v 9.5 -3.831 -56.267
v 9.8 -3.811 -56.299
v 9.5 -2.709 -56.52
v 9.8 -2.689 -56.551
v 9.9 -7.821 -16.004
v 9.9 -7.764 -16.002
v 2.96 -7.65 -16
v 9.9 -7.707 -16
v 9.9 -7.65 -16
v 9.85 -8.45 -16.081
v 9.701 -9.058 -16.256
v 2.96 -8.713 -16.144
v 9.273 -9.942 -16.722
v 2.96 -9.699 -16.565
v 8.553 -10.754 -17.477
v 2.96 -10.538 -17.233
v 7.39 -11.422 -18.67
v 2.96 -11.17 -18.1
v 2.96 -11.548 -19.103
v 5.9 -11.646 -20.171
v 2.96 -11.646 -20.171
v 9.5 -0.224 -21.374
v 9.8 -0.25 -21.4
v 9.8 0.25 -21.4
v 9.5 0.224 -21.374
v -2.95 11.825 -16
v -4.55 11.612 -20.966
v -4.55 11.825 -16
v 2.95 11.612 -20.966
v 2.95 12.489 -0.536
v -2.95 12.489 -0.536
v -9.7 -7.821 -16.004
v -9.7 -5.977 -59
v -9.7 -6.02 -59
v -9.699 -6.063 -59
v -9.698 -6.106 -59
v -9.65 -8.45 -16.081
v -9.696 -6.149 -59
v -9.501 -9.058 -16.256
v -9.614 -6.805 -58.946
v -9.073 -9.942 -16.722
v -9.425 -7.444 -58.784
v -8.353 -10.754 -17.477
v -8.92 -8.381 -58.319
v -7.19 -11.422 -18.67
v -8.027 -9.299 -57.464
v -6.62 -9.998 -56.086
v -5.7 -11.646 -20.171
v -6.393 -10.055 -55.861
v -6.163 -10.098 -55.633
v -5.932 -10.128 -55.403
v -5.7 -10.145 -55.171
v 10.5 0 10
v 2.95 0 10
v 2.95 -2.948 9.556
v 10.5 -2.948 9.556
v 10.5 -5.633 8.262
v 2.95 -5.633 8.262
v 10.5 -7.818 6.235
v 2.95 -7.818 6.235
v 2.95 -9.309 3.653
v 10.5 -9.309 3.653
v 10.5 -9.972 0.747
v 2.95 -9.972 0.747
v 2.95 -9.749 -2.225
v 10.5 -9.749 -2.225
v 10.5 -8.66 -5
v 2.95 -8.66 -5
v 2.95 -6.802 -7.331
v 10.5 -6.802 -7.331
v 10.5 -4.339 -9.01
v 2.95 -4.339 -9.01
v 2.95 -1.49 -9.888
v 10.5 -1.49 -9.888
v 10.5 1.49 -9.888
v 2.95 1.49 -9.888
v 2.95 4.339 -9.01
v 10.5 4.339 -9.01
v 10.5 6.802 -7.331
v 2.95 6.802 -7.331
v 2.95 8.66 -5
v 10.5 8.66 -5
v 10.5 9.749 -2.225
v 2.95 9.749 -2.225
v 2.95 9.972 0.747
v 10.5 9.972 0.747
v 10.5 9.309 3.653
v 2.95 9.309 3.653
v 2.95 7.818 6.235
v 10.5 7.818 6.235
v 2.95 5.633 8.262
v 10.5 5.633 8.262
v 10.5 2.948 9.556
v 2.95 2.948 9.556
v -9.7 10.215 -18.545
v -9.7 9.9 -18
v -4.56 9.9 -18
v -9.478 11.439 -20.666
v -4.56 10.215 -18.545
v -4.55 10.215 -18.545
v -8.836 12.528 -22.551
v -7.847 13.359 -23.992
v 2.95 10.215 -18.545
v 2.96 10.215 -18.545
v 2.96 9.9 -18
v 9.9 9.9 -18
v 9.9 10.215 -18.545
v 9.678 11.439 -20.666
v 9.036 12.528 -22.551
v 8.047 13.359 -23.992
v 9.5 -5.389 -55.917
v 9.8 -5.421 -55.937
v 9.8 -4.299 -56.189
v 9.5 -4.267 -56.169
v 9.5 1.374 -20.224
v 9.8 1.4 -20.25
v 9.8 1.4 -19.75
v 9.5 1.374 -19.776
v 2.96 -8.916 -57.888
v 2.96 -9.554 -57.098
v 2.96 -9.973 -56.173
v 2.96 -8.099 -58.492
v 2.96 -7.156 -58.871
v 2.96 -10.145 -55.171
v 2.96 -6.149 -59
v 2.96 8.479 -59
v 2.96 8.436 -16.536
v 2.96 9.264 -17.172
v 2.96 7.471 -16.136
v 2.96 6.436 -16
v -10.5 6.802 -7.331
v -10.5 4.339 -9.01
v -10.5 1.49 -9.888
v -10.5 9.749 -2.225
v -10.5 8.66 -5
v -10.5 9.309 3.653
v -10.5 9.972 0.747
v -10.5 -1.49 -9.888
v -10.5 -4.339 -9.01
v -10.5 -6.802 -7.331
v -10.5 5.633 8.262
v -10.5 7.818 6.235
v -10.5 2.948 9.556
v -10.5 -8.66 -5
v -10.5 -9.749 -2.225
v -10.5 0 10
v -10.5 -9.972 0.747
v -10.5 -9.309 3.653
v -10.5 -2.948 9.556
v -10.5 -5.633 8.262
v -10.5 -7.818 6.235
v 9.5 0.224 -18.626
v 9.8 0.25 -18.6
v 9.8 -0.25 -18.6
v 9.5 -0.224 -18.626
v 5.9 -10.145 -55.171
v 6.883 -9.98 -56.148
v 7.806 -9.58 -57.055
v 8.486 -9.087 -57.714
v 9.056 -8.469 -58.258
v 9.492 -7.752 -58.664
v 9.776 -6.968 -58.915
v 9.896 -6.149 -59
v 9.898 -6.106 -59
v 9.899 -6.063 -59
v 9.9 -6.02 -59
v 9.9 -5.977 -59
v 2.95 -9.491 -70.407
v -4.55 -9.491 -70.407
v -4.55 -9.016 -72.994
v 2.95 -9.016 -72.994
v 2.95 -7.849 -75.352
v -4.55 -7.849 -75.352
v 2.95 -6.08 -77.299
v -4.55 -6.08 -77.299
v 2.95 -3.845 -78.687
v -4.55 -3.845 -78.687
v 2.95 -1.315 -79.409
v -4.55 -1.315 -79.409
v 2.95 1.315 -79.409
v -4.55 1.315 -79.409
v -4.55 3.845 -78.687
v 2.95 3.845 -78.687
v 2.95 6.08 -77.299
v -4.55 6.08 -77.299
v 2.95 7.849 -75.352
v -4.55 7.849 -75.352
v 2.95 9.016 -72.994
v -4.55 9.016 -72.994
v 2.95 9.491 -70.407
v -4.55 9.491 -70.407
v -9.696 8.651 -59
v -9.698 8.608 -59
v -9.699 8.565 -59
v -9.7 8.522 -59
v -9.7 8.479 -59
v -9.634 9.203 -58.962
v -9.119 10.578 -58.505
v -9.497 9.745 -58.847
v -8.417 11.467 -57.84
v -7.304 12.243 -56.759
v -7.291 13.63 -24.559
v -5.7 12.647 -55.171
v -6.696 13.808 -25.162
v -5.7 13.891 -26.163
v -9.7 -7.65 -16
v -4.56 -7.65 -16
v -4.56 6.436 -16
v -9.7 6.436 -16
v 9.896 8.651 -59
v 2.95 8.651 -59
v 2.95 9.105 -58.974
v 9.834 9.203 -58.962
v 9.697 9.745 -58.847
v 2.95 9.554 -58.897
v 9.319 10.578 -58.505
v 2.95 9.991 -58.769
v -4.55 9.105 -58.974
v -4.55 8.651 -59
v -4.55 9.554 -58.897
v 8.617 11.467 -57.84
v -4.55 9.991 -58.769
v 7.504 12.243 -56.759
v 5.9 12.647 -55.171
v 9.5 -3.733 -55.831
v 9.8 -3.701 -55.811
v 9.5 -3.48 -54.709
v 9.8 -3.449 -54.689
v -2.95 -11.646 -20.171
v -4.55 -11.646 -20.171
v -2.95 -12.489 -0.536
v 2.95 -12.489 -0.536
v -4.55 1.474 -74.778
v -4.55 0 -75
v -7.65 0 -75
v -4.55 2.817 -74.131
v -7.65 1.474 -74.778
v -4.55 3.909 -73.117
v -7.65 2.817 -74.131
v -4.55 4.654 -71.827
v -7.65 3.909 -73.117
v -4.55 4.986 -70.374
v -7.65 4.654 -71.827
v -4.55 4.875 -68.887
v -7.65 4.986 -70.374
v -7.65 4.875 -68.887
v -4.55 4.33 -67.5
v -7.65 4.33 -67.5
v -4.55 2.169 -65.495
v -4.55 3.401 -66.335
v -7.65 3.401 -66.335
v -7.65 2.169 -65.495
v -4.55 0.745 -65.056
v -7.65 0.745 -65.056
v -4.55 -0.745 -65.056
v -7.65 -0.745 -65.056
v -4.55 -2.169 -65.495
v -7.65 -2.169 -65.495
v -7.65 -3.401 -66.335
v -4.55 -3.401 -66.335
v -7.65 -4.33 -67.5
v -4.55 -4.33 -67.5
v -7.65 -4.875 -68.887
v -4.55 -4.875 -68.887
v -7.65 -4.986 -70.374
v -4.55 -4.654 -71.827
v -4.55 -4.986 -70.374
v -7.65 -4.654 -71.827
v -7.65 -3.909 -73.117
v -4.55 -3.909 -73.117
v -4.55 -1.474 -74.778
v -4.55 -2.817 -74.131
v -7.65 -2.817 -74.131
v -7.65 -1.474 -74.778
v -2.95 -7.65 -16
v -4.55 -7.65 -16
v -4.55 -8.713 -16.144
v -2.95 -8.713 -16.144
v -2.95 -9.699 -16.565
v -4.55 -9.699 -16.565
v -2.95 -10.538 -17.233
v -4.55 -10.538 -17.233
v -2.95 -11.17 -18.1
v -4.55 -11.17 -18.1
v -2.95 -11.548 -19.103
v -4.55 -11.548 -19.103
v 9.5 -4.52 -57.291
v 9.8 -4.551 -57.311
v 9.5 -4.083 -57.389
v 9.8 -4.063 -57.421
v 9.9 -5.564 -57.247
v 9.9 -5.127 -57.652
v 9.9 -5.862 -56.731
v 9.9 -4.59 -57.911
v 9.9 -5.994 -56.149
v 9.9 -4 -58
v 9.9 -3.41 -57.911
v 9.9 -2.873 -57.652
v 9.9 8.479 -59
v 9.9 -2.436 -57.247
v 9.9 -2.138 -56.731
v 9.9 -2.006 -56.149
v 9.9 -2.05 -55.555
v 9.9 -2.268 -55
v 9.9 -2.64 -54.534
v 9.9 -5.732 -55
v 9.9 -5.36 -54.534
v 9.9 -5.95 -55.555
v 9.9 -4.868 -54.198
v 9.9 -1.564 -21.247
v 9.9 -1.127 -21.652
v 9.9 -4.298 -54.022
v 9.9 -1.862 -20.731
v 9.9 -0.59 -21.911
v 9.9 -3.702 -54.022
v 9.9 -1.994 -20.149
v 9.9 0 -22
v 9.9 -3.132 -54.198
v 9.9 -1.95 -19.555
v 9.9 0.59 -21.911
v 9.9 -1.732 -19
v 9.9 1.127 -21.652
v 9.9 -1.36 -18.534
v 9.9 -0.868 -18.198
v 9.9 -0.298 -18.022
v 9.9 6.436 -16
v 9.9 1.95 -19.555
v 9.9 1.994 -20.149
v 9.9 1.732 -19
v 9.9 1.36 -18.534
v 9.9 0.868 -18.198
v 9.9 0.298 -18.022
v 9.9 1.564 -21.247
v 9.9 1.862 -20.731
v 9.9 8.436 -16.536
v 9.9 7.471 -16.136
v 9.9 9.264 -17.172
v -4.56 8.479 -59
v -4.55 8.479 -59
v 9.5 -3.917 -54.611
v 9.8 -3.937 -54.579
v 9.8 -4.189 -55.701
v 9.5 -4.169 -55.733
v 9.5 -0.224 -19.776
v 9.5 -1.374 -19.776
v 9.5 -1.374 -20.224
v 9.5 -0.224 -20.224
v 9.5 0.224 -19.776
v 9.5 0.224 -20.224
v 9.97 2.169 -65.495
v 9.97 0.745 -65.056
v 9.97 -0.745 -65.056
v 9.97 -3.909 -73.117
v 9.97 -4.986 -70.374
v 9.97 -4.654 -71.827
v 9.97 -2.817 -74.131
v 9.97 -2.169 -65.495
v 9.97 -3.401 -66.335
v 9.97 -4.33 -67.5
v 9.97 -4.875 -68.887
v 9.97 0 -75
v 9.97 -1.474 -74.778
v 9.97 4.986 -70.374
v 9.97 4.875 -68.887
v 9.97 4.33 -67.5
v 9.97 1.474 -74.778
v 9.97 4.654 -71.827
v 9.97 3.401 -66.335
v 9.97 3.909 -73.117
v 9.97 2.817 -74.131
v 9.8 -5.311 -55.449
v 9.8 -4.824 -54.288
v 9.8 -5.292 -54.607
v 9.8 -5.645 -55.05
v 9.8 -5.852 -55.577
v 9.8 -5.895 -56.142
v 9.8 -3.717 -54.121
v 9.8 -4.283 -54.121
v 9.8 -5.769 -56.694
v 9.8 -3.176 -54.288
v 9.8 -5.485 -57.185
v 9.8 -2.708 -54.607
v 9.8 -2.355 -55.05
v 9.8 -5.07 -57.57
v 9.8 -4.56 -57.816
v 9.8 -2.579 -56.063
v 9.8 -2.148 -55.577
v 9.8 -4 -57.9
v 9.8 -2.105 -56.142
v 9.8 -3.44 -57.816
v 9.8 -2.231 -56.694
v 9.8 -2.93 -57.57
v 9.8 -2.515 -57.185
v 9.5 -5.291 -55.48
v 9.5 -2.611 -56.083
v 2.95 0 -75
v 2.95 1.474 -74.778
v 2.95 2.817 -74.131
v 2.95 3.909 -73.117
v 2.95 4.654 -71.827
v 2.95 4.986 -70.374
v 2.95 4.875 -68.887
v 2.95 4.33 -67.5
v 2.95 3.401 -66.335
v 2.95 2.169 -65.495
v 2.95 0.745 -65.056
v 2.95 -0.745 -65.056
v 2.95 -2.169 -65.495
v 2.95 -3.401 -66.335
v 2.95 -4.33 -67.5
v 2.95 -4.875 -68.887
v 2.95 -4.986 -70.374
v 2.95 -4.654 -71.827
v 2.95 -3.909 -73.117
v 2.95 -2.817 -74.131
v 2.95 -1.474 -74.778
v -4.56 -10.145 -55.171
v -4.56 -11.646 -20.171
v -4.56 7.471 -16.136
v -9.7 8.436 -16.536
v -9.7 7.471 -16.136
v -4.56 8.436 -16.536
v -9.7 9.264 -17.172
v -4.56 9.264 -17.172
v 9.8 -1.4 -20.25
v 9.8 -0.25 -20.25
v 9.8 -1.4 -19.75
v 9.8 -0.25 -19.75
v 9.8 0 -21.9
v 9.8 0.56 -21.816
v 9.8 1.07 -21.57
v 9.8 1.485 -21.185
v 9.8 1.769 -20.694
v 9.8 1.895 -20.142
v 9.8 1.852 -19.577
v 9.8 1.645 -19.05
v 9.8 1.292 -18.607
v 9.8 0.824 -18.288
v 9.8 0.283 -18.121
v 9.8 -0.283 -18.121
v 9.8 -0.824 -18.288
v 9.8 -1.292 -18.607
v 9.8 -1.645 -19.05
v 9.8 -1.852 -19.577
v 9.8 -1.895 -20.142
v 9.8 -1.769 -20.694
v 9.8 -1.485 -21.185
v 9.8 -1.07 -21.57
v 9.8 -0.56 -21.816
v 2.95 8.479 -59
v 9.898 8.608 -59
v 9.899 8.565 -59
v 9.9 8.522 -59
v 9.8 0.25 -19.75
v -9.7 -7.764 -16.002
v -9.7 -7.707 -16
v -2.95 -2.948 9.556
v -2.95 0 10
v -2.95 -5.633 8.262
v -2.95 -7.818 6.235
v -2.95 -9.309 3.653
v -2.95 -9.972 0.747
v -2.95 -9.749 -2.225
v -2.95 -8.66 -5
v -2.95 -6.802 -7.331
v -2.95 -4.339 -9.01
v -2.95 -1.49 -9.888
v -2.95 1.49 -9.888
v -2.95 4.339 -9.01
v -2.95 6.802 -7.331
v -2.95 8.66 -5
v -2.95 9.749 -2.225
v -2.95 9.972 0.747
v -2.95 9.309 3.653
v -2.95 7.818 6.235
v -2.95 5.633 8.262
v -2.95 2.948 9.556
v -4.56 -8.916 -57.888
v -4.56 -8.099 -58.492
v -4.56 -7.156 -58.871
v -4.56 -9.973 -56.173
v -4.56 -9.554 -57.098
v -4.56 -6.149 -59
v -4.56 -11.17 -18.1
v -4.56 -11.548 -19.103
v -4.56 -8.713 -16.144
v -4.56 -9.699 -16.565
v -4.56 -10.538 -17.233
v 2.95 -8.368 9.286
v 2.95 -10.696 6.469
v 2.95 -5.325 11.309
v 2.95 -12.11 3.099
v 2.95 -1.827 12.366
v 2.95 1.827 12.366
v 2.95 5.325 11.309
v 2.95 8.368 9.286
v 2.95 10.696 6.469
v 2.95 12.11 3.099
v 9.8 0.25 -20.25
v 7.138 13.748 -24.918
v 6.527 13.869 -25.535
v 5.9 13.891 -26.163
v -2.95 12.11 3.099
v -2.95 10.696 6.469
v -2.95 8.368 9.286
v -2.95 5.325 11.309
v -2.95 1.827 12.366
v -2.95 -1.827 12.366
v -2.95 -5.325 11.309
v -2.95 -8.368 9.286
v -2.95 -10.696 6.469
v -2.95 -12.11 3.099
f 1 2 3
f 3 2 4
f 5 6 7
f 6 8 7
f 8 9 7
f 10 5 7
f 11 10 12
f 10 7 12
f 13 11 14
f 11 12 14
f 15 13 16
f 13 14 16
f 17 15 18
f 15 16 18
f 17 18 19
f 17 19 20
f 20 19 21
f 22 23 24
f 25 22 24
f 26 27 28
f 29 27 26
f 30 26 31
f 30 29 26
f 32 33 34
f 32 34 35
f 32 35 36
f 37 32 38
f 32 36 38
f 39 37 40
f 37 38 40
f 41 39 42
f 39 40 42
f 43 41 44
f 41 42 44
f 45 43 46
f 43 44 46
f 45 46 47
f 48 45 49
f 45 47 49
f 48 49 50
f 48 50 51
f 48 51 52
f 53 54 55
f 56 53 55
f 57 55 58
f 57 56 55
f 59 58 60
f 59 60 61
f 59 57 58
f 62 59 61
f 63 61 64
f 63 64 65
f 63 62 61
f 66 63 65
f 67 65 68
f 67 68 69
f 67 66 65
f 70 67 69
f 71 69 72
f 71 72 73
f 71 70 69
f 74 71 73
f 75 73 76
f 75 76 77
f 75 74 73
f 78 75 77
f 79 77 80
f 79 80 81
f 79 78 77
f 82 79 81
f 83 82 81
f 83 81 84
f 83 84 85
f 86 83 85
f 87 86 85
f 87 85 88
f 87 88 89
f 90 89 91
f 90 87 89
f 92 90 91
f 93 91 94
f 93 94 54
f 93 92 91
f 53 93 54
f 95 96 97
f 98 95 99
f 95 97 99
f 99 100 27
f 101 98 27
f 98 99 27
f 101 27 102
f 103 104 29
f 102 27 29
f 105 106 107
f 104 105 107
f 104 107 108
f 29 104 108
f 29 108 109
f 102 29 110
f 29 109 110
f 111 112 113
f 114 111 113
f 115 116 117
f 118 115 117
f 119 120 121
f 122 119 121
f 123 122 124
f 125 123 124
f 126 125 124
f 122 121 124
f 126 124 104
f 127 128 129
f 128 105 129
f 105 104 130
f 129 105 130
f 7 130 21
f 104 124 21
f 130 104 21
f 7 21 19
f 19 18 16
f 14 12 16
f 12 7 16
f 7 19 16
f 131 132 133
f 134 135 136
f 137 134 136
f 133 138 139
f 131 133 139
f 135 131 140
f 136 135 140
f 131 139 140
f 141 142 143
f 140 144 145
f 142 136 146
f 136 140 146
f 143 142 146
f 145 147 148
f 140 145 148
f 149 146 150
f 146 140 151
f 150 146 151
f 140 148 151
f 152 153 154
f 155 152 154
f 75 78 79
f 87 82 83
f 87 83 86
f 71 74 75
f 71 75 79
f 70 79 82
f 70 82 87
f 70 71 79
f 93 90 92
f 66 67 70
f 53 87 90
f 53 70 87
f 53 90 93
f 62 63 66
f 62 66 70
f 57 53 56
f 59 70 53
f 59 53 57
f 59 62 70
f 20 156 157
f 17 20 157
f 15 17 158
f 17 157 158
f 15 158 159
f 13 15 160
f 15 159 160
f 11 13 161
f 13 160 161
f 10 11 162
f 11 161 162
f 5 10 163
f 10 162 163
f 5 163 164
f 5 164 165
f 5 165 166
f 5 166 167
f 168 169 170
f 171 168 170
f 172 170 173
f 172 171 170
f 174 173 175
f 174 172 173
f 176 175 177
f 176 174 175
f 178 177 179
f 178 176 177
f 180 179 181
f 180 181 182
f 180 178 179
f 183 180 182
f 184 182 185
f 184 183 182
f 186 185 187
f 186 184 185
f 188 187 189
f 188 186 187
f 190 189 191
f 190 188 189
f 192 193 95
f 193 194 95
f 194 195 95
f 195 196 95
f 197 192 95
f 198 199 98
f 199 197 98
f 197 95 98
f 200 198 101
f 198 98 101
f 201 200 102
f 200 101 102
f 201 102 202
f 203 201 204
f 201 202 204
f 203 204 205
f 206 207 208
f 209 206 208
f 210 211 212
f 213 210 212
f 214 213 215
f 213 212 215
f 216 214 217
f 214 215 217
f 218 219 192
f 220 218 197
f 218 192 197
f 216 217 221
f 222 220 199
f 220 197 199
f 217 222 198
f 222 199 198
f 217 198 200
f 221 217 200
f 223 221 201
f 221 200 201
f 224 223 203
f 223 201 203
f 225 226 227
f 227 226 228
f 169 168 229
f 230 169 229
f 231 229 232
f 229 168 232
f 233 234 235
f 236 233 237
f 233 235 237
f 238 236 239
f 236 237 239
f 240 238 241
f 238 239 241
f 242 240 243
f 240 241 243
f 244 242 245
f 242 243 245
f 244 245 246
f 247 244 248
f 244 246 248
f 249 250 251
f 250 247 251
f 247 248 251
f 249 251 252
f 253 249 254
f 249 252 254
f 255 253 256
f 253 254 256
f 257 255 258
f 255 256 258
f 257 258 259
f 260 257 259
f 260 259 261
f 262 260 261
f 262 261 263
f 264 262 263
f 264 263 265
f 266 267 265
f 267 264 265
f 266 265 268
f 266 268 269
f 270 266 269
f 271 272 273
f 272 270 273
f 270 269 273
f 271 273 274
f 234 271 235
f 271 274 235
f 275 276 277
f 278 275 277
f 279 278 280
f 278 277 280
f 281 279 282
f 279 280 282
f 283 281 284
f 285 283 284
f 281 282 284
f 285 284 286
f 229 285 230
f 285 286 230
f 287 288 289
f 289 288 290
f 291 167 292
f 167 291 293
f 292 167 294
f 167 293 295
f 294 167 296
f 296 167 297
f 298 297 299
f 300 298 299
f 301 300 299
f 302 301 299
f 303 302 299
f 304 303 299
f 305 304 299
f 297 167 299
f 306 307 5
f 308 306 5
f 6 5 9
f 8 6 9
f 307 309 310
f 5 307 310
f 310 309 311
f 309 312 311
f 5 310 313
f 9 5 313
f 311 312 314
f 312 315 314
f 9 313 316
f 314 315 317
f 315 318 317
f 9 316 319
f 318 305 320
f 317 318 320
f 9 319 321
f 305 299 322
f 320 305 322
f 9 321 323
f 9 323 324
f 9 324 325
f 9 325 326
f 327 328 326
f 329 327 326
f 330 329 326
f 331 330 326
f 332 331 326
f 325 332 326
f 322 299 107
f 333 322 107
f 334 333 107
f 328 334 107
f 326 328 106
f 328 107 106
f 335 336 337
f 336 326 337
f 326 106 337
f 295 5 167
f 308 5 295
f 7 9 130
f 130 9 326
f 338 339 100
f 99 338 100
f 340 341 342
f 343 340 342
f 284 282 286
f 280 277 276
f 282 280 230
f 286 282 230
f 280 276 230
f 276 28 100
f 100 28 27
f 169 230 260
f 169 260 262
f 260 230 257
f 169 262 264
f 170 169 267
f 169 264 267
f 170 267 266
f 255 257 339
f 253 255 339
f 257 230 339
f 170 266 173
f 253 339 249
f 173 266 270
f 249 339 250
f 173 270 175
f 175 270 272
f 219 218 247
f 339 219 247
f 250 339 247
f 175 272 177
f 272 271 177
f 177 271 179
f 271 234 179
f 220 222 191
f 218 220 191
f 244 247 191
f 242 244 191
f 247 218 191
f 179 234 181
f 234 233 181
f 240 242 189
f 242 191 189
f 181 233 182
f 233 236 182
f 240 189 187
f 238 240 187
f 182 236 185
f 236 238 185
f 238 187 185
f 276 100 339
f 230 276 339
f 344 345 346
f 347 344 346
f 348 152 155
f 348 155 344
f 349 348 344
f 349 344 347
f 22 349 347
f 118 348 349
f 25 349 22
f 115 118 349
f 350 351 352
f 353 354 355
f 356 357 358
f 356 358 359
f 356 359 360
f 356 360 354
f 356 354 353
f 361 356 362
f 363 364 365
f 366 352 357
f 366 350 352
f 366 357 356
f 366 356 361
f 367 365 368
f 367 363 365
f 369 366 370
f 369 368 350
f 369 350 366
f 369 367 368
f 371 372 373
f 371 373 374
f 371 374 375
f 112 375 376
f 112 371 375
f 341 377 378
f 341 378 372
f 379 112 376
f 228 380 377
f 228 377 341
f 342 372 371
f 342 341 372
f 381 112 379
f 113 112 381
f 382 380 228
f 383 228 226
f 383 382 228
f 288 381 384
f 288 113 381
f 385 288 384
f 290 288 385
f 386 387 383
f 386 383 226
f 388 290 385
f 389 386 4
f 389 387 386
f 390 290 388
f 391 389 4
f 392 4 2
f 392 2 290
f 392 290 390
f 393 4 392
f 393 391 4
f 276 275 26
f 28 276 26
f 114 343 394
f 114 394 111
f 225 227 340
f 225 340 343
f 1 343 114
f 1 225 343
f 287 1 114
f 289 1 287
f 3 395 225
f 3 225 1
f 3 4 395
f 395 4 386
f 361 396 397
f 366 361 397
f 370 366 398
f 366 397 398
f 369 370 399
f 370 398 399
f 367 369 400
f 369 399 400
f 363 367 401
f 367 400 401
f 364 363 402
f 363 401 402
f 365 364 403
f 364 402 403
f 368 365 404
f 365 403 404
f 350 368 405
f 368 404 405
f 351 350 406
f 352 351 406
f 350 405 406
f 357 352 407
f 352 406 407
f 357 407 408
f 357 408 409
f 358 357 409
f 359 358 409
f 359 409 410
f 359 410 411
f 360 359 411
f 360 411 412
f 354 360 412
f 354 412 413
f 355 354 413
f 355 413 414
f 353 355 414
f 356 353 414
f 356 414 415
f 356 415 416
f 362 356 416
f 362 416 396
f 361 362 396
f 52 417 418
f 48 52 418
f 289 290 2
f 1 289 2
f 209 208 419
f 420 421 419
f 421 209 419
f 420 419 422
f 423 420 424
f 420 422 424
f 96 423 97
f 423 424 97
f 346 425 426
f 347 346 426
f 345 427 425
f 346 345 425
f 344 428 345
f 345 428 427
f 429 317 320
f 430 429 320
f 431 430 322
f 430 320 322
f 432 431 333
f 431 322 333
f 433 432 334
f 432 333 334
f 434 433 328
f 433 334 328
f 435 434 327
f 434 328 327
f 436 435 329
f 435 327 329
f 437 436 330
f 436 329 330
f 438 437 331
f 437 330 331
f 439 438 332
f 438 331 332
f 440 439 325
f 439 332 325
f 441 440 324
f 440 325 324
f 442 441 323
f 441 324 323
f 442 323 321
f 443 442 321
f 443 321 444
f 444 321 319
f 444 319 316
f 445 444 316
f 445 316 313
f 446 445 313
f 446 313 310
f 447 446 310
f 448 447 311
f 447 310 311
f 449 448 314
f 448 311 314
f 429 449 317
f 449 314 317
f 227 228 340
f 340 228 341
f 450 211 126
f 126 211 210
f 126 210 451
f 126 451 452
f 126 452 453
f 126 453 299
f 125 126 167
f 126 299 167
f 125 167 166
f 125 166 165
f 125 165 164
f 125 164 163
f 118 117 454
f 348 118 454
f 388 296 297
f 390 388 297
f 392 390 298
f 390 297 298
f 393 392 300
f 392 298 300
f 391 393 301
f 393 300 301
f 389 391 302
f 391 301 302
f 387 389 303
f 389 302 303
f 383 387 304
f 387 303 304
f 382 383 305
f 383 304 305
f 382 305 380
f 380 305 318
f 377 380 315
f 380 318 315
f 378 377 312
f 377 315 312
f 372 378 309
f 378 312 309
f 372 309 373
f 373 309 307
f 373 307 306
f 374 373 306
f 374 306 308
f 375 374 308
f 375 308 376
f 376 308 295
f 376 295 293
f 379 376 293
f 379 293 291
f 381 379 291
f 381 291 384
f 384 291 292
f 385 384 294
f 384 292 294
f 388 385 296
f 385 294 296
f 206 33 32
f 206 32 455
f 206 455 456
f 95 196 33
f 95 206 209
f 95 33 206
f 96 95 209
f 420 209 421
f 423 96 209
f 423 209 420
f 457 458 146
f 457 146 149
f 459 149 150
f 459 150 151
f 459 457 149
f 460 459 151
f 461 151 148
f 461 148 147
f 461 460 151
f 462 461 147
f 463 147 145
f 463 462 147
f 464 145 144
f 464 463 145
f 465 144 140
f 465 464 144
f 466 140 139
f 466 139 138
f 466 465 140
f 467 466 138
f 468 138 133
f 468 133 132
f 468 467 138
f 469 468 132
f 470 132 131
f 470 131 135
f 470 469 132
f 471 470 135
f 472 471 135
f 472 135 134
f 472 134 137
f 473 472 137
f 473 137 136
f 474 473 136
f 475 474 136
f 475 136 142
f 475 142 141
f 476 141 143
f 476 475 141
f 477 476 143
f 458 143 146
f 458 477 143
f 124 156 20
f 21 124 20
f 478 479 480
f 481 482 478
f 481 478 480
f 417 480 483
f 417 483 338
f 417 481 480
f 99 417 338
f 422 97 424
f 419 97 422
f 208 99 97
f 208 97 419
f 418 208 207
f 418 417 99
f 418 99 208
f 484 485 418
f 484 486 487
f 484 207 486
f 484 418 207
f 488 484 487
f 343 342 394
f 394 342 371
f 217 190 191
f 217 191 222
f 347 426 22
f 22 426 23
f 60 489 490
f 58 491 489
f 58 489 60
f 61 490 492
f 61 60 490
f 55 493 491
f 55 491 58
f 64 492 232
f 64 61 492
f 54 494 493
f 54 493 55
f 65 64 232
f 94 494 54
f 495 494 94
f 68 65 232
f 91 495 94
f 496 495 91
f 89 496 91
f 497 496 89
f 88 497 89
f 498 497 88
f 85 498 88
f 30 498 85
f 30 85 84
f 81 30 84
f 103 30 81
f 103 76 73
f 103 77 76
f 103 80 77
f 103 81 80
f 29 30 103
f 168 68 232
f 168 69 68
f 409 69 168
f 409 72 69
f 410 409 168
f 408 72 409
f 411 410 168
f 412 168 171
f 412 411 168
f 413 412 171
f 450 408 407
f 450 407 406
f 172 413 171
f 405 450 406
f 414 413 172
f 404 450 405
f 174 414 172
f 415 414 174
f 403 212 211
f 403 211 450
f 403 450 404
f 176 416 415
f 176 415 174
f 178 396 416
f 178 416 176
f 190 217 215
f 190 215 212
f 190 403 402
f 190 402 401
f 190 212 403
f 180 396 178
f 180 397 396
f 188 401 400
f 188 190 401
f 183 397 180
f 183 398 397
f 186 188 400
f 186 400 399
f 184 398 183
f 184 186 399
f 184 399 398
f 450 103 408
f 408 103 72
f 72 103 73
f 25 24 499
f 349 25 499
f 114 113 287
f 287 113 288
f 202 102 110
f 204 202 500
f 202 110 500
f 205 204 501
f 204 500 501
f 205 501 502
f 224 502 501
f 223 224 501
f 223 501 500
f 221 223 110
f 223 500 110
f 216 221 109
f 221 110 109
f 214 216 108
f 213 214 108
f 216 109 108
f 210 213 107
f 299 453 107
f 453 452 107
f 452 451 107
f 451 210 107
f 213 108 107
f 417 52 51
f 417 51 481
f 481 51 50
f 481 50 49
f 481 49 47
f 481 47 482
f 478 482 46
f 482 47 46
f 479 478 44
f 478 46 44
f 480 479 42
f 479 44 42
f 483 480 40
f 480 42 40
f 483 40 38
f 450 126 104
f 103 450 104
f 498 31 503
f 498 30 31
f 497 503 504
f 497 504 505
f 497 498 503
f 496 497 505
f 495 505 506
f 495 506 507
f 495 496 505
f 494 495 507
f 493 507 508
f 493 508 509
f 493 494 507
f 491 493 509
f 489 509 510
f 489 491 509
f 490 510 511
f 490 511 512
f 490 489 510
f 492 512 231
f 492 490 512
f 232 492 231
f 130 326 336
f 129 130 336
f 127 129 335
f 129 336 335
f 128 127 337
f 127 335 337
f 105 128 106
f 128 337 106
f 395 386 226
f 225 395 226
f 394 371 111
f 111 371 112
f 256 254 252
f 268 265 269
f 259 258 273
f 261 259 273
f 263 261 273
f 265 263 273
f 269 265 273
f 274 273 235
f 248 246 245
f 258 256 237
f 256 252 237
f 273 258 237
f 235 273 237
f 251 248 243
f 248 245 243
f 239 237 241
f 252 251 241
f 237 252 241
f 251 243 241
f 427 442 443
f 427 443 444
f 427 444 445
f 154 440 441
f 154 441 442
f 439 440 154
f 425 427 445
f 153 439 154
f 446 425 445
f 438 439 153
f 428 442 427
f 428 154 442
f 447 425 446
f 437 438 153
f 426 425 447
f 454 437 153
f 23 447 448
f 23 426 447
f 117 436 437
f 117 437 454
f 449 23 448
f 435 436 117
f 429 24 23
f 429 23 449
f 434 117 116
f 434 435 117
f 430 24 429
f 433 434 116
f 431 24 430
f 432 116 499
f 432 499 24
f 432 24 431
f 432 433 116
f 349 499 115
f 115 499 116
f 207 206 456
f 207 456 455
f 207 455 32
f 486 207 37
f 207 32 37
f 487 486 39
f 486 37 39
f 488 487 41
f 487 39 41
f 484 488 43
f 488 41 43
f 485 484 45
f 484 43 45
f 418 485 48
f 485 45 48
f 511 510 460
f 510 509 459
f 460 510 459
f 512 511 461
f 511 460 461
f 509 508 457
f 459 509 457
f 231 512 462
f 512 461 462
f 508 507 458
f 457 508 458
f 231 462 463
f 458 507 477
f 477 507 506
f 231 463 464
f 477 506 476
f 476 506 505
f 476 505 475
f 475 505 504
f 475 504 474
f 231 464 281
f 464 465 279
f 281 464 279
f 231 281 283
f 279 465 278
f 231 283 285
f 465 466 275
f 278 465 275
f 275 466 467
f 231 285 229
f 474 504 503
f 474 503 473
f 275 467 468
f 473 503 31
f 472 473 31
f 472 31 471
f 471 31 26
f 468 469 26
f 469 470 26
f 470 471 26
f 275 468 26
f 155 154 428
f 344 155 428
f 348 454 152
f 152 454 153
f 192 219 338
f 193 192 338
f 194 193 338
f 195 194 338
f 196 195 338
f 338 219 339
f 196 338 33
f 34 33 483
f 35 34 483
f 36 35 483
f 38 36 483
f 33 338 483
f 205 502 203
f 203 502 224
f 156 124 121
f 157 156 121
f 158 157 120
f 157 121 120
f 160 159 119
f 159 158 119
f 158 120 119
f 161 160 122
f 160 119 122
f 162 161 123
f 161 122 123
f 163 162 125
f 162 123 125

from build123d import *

# Parameters (mm, degrees)
BOSS_EXTRUDE1_DEPTH              = 2.95
BOSS_EXTRUDE2_DEPTH              = 1.6
SKETCH3_R                        = 10
BOSS_EXTRUDE3_DEPTH              = 10.5
FILLET1_R                        = 4
BOSS_EXTRUDE4_DEPTH              = 5.15
BOSS_EXTRUDE4_DEPTH_BACK         = 14.45
CUT_EXTRUDE1_REACH               = 87.429
CUT_EXTRUDE1_OFFSET_FROM_SURFACE = 1.5
SKETCH6_W                        = 0.00999999999999979
SKETCH6_H                        = 45.002265551352366
SKETCH6_W_2                      = 0.01000000000000023
SKETCH6_H_2                      = 45.03954427852518
FILLET2_R                        = 4
BOSS_EXTRUDE5_DEPTH              = 7.02
BOSS_EXTRUDE5_DEPTH_BACK         = 10.6
SKETCH7_R                        = 5.000000000000004
SKETCH8_R                        = 2.000000000000003
CUT_EXTRUDE2_DEPTH               = 0.1
CUT_EXTRUDE2_DRAFT               = -45.0000000000001
CUT_EXTRUDE2_PROFILE_2_DEPTH     = 0.1
CUT_EXTRUDE2_PROFILE_2_DRAFT     = -45.0000000000001
CUT_EXTRUDE3_DEPTH               = 0.3
CUT_EXTRUDE3_DRAFT               = -5.000000000000011
CUT_EXTRUDE3_PROFILE_2_DEPTH     = 0.3
CUT_EXTRUDE3_PROFILE_2_DRAFT     = -5.000000000000011


with BuildPart() as part:
    # Sketch1 → Boss-Extrude1 (new, symmetric)
    with BuildSketch(Plane(origin=(0, 0, 0), x_dir=(0, 0, -1), z_dir=(1, 0, 0))):
        with BuildLine():
            Line((0.5357142857142857, -12.488515132075614), (70.40714285714286, -9.491271500377467))
            ThreePointArc((70.40714285714286, -9.491271500377467), (79.5, 0), (70.40714285714286, 9.491271500377463))
            Line((70.40714285714286, 9.491271500377463), (0.5357142857142858, 12.488515132075614))
            ThreePointArc((0.5357142857142858, 12.488515132075614), (-12.499999999999998, 1.53e-15), (0.5357142857142857, -12.488515132075614))
        make_face()
    extrude(amount=BOSS_EXTRUDE1_DEPTH, both=True)

    # Sketch2 → Boss-Extrude2 (add)
    with BuildSketch(Plane.ZY.offset(2.95)):
        with BuildLine():
            Line((-70.40714285714286, 9.491271500377463), (-16, 11.825150537654586))
            Line((-16, 11.825150537654586), (-15.999999999999993, -11.825150537654586))
            Line((-15.999999999999993, -11.825150537654586), (-70.40714285714286, -9.491271500377465))
            ThreePointArc((-70.40714285714286, -9.491271500377465), (-79.5, 1.16e-15), (-70.40714285714286, 9.491271500377463))
        make_face()
    extrude(amount=BOSS_EXTRUDE2_DEPTH)

    # Sketch3 → Boss-Extrude3 (add, symmetric)
    with BuildSketch(Plane(origin=(0, 0, 0), x_dir=(0, 0, -1), z_dir=(1, 0, 0))):
        with Locations(Location((0, 0, 0), (0, 0, 180))):
            Circle(SKETCH3_R)
    extrude(amount=BOSS_EXTRUDE3_DEPTH, both=True)

    # Fillet1
    fillet1_edges = [part.edges().sort_by_distance(p)[0] for p in [
        (-3.75, -11.825150537654586, -15.999999999999993),
    ]]
    fillet(fillet1_edges, radius=FILLET1_R)

    # Sketch4 → Boss-Extrude4 (add, two sides: drawn at the far end of the back side and taken through both)
    with BuildSketch(Plane.ZY.offset(4.55).offset(-BOSS_EXTRUDE4_DEPTH_BACK)):
        Polygon((-15.999999999999993, -11.825150537654581), (-15.999999999999993, 8.745228199074802), (-24.999999999999993, 13.941380621781402), (-58.99999999999999, 12.482897725964271), (-58.99999999999999, -9.980598640003508), align=None)
    extrude(amount=BOSS_EXTRUDE4_DEPTH + BOSS_EXTRUDE4_DEPTH_BACK)

    # Cut-Extrude1: up to this face of the body (flat: up to its plane, moved by the offset)
    cut_extrude1_end = Plane(part.part.faces().sort_by_distance((-0.231891902, 12.029817895, -11.228816075))[0]).offset(-CUT_EXTRUDE1_OFFSET_FROM_SURFACE)
    # Sketch6 → Cut-Extrude1 (cut, up to the picked face)
    with BuildSketch(Plane(origin=(0, -12.488515132075618, -0.5357142857142859), x_dir=(1, 0, 0), z_dir=(0, -0.9990812105660494, -0.04285714285714288)), mode=Mode.PRIVATE) as cut_extrude1_sk1:
        with Locations((-4.555, -37.97963997883348)):
            Rectangle(SKETCH6_W, SKETCH6_H)
    cut_extrude1_tool1 = split(extrude(cut_extrude1_sk1.sketch, amount=-CUT_EXTRUDE1_REACH, mode=Mode.PRIVATE), bisect_by=cut_extrude1_end, keep=Keep.BOTH, mode=Mode.PRIVATE)
    # Sketch6 → Cut-Extrude1 (cut, up to the picked face)
    with BuildSketch(Plane(origin=(0, -12.488515132075618, -0.5357142857142859), x_dir=(1, 0, 0), z_dir=(0, -0.9990812105660494, -0.04285714285714288)), mode=Mode.PRIVATE) as cut_extrude1_sk2:
        with Locations((2.955, -37.99827934241989)):
            Rectangle(SKETCH6_W_2, SKETCH6_H_2)
    cut_extrude1_tool2 = split(extrude(cut_extrude1_sk2.sketch, amount=-CUT_EXTRUDE1_REACH, mode=Mode.PRIVATE), bisect_by=cut_extrude1_end, keep=Keep.BOTH, mode=Mode.PRIVATE)
    add(cut_extrude1_tool1.solids().sort_by(Axis((-4.555, -10.860816, -38.480459), (0, 0.9990812105660494, 0.04285714285714288)))[0], mode=Mode.SUBTRACT)
    add(cut_extrude1_tool2.solids().sort_by(Axis((2.955, -10.860017, -38.499081), (0, 0.9990812105660494, 0.04285714285714288)))[0], mode=Mode.SUBTRACT)

    # Fillet2
    # the kernel refuses this fillet: 4 mm, written as the material it adds along each edge
    # the kernel refuses this fillet: 4 mm, written as the material it takes off along each edge
    with BuildSketch(Plane(origin=(-14.988161901436335, -11.825150537654586, -15.999999999999993), x_dir=(0, 0.04285714285714257, -0.9990812105660493), z_dir=(1, 0, 0))) as fillet2_2_piece_1:
        with BuildLine():
            CenterArc((FILLET2_R * 1.04381619014, FILLET2_R), FILLET2_R, 177.54371427641803, 92.45628572358197)
            Line((FILLET2_R * 0.0447349795776, FILLET2_R * 1.04285714286), (0, 0))
            Line((0, 0), (FILLET2_R * 1.04381619014, 0))
        make_face()
    extrude(amount=12.038161901436336, mode=Mode.SUBTRACT)
    with BuildSketch(Plane(origin=(-14.988161901436335, -11.825150537654586, -15.999999999999993), x_dir=(0, 0.04285714285714257, -0.9990812105660493), z_dir=(1, 0, 0))) as fillet2_2_piece_2_section:
        with BuildLine():
            CenterArc((FILLET2_R * 1.04381619014, FILLET2_R), FILLET2_R, 177.54371427641803, 92.45628572358197)
            Line((FILLET2_R * 0.0447349795776, FILLET2_R * 1.04285714286), (0, 0))
            Line((0, 0), (FILLET2_R * 1.04381619014, 0))
        make_face()
    fillet2_2_piece_2 = extrude(amount=22.47632380287267, mode=Mode.PRIVATE)
    fillet2_2_piece_2 = split(fillet2_2_piece_2, bisect_by=Plane(origin=(2.9600000000000004, -10.846311572952873, -16.937750318441594), z_dir=(1, 0, 0)), keep=Keep.TOP, mode=Mode.PRIVATE)
    add(fillet2_2_piece_2, mode=Mode.SUBTRACT)
    with BuildSketch(Plane(origin=(-7.478161901436335, -11.825150537654586, -15.999999999999993), x_dir=(0, 0.04285714285714257, -0.9990812105660493), z_dir=(1, 0, 0))) as fillet2_2_piece_3_section:
        with BuildLine():
            CenterArc((FILLET2_R * 1.04381619014, FILLET2_R), FILLET2_R, 177.54371427641803, 92.45628572358197)
            Line((FILLET2_R * 0.0447349795776, FILLET2_R * 1.04285714286), (0, 0))
            Line((0, 0), (FILLET2_R * 1.04381619014, 0))
        make_face()
    fillet2_2_piece_3 = extrude(amount=27.816323802872674, mode=Mode.PRIVATE)
    fillet2_2_piece_3 = split(fillet2_2_piece_3, bisect_by=Plane(origin=(-2.95, -10.846311572952875, -16.937750318441612), z_dir=(-1, 0, 0)), keep=Keep.TOP, mode=Mode.PRIVATE)
    add(fillet2_2_piece_3, mode=Mode.SUBTRACT)
    with BuildSketch(Plane(origin=(2.960000000000001, -11.825150537654581, -15.999999999999993), x_dir=(0, 0.042857142857141296, -0.9990812105660493), z_dir=(1, 0, 0))) as fillet2_2_piece_4:
        with BuildLine():
            CenterArc((FILLET2_R * 1.04381619014, FILLET2_R), FILLET2_R, 177.54371427641803, 92.45628572358203)
            Line((FILLET2_R * 0.0447349795776, FILLET2_R * 1.04285714286), (0, 0))
            Line((0, 0), (FILLET2_R * 1.04381619014, -1e-17))
        make_face()
    extrude(amount=17.378161901436336, mode=Mode.SUBTRACT)
    with BuildSketch(Plane(origin=(9.899999999999999, -9.552027211432081, -68.9908121056605), x_dir=(0, 0.9990812105660493, 0.04285714285714272), z_dir=(0, -0.042857142857142726, 0.9990812105660493))) as fillet2_2_piece_5:
        with BuildLine():
            CenterArc((FILLET2_R, FILLET2_R), FILLET2_R, 180, 90)
            Line((-6.1e-16, FILLET2_R), (0, 0))
            Line((0, 0), (FILLET2_R, 0))
        make_face()
    extrude(amount=63.039544278525156, mode=Mode.SUBTRACT)
    with BuildSketch(Plane(origin=(-6.620230786249788, -9.980598640003508, -58.99999999999999), x_dir=(0, -0.042857142857142885, 0.9990812105660493), z_dir=(1, 0, 0))) as fillet2_2_piece_6_section:
        with BuildLine():
            CenterArc((FILLET2_R * 0.958023078625, -FILLET2_R), FILLET2_R, 89.99999999999999, 87.54371427641804)
            Line((-FILLET2_R * 0.0410581319411, -FILLET2_R * 0.957142857143), (0, 0))
            Line((0, 0), (FILLET2_R * 0.958023078625, 0))
        make_face()
    fillet2_2_piece_6 = extrude(amount=26.100461572499576, mode=Mode.PRIVATE)
    fillet2_2_piece_6 = split(fillet2_2_piece_6, bisect_by=Plane(origin=(-4.55, -9.166381712824048, -58.15010718912109), z_dir=(-1, 0, 0)), keep=Keep.TOP, mode=Mode.PRIVATE)
    add(fillet2_2_piece_6, mode=Mode.SUBTRACT)
    with BuildSketch(Plane(origin=(2.960000000000001, -9.980598640003508, -58.99999999999999), x_dir=(0, -0.042857142857142885, 0.9990812105660493), z_dir=(1, 0, 0))) as fillet2_2_piece_7:
        with BuildLine():
            CenterArc((FILLET2_R * 0.958023078625, -FILLET2_R), FILLET2_R, 89.99999999999999, 87.54371427641804)
            Line((-FILLET2_R * 0.0410581319411, -FILLET2_R * 0.957142857143), (0, 0))
            Line((0, 0), (FILLET2_R * 0.958023078625, 0))
        make_face()
    extrude(amount=16.520230786249787, mode=Mode.SUBTRACT)
    with BuildSketch(Plane(origin=(-19.28023078624979, 12.482897725964271, -58.99999999999999), x_dir=(0, 0.042857142857142885, 0.9990812105660493), z_dir=(1, 0, 0))) as fillet2_2_piece_8_section:
        with BuildLine():
            CenterArc((FILLET2_R * 0.958023078625, FILLET2_R), FILLET2_R, 182.45628572358197, 87.54371427641803)
            Line((-FILLET2_R * 0.0410581319411, FILLET2_R * 0.957142857143), (0, 0))
            Line((0, 0), (FILLET2_R * 0.958023078625, 0))
        make_face()
    fillet2_2_piece_8 = extrude(amount=38.76046157249958, mode=Mode.PRIVATE)
    fillet2_2_piece_8 = split(fillet2_2_piece_8, bisect_by=Plane(origin=(-7.12500000000003, 10.021335989457187, -58.05033519049316), z_dir=(0, 0.9990812105660493, -0.042857142857142906)), keep=Keep.TOP, mode=Mode.PRIVATE)
    add(fillet2_2_piece_8, mode=Mode.SUBTRACT)
    with BuildSketch(Plane(origin=(-19.28023078624979, 12.482897725964271, -58.99999999999999), x_dir=(0, 0.042857142857142885, 0.9990812105660493), z_dir=(1, 0, 0))) as fillet2_2_piece_9_section:
        with BuildLine():
            CenterArc((FILLET2_R * 0.958023078625, FILLET2_R), FILLET2_R, 182.45628572358197, 87.54371427641803)
            Line((-FILLET2_R * 0.0410581319411, FILLET2_R * 0.957142857143), (0, 0))
            Line((0, 0), (FILLET2_R * 0.958023078625, 0))
        make_face()
    fillet2_2_piece_9 = extrude(amount=38.76046157249958, mode=Mode.PRIVATE)
    fillet2_2_piece_9 = split(fillet2_2_piece_9, bisect_by=Plane(origin=(-4.55, 9.653804076800146, -58.93114204733473), z_dir=(-1, 0, 0)), keep=Keep.TOP, mode=Mode.PRIVATE)
    add(fillet2_2_piece_9, mode=Mode.SUBTRACT)
    with BuildSketch(Plane(origin=(-19.28023078624979, 12.482897725964271, -58.99999999999999), x_dir=(0, 0.042857142857142885, 0.9990812105660493), z_dir=(1, 0, 0))) as fillet2_2_piece_10_section:
        with BuildLine():
            CenterArc((FILLET2_R * 0.958023078625, FILLET2_R), FILLET2_R, 182.45628572358197, 87.54371427641803)
            Line((-FILLET2_R * 0.0410581319411, FILLET2_R * 0.957142857143), (0, 0))
            Line((0, 0), (FILLET2_R * 0.958023078625, 0))
        make_face()
    fillet2_2_piece_10 = extrude(amount=38.76046157249958, mode=Mode.PRIVATE)
    fillet2_2_piece_10 = split(fillet2_2_piece_10, bisect_by=Plane(origin=(2.95, 9.653804076800148, -58.931142047334724), z_dir=(1, 0, 0)), keep=Keep.TOP, mode=Mode.PRIVATE)
    add(fillet2_2_piece_10, mode=Mode.SUBTRACT)
    with BuildSketch(Plane(origin=(9.899999999999999, 14.36995205035283, -15.009187894339503), x_dir=(-1, 0, 0), z_dir=(0, -0.04285714285714283, -0.9990812105660493))) as fillet2_2_piece_11:
        with BuildLine():
            CenterArc((FILLET2_R, -FILLET2_R), FILLET2_R, 90, 90)
            Line((0, -FILLET2_R), (0, 0))
            Line((0, 0), (FILLET2_R, 0))
        make_face()
    extrude(amount=54.03126756906639, mode=Mode.SUBTRACT)
    with BuildSketch(Plane(origin=(12.810595773347721, 13.941380621781402, -24.999999999999993), x_dir=(0, -0.4999999999999976, 0.8660254037844399), z_dir=(-1, 0, 0))) as fillet2_2_piece_12:
        with BuildLine():
            CenterArc((FILLET2_R * 0.291059577335, -FILLET2_R), FILLET2_R, 90.00000000000003, 32.45628572358184)
            Line((-FILLET2_R * 0.245596402396, -FILLET2_R * 0.156198862635), (0, 0))
            Line((0, 0), (FILLET2_R * 0.291059577335, 4e-17))
        make_face()
    extrude(amount=25.421191546695447, mode=Mode.SUBTRACT)
    with BuildSketch(Plane(origin=(15.673502691896278, 8.745228199074802, -15.999999999999993), x_dir=(0, 0.49999999999999767, -0.8660254037844399), z_dir=(-1, 0, 0))) as fillet2_2_piece_13:
        with BuildLine():
            CenterArc((FILLET2_R * 0.57735026919, FILLET2_R), FILLET2_R, 209.99999999999983, 60.00000000000023)
            Line((-FILLET2_R * 0.288675134595, FILLET2_R * 0.5), (0, 0))
            Line((0, 0), (FILLET2_R * 0.57735026919, 0))
        make_face()
    extrude(amount=12.713502691896277, mode=Mode.SUBTRACT)
    with BuildSketch(Plane(origin=(-9.7, -9.55202721143208, -68.99081210566048), x_dir=(1, -1.5e-16, -1e-17), z_dir=(0, -0.042857142857142726, 0.9990812105660493))) as fillet2_2_piece_14:
        with BuildLine():
            CenterArc((FILLET2_R, FILLET2_R), FILLET2_R, 180, 90)
            Line((-6.1e-16, FILLET2_R), (0, 0))
            Line((0, 0), (FILLET2_R, 0))
        make_face()
    extrude(amount=63.039544278525156, mode=Mode.SUBTRACT)
    with BuildSketch(Plane(origin=(-9.7, 14.36995205035283, -15.009187894339501), x_dir=(0, -0.9990812105660493, 0.04285714285714283), z_dir=(0, -0.04285714285714283, -0.9990812105660493))) as fillet2_2_piece_15:
        with BuildLine():
            CenterArc((FILLET2_R, -FILLET2_R), FILLET2_R, 90, 90)
            Line((-1.77e-15, -FILLET2_R), (0, 0))
            Line((0, 0), (FILLET2_R, 0))
        make_face()
    extrude(amount=54.031267569066415, mode=Mode.SUBTRACT)
    with BuildSketch(Plane(origin=(1.2135026918962772, 8.745228199074806, -15.999999999999998), x_dir=(0, 0.4999999999999975, -0.8660254037844403), z_dir=(-1, 0, 0))) as fillet2_2_piece_16_section:
        with BuildLine():
            CenterArc((FILLET2_R * 0.57735026919, FILLET2_R), FILLET2_R, 209.99999999999983, 60.00000000000017)
            Line((-FILLET2_R * 0.288675134595, FILLET2_R * 0.5), (0, 0))
            Line((0, 0), (FILLET2_R * 0.57735026919, 0))
        make_face()
    fillet2_2_piece_16 = extrude(amount=16.687005383792552, mode=Mode.PRIVATE)
    fillet2_2_piece_16 = split(fillet2_2_piece_16, bisect_by=Plane(origin=(-4.55, 8.502953144076557, -16.419632704663513), z_dir=(-1, 0, 0)), keep=Keep.TOP, mode=Mode.PRIVATE)
    add(fillet2_2_piece_16, mode=Mode.SUBTRACT)
    with BuildSketch(Plane(origin=(-19.28023078624979, -9.980598640003508, -58.99999999999999), x_dir=(0, -0.042857142857142885, 0.9990812105660493), z_dir=(1, 0, 0))) as fillet2_2_piece_17_section:
        with BuildLine():
            CenterArc((FILLET2_R * 0.958023078625, -FILLET2_R), FILLET2_R, 89.99999999999999, 87.54371427641804)
            Line((-FILLET2_R * 0.0410581319411, -FILLET2_R * 0.957142857143), (0, 0))
            Line((0, 0), (FILLET2_R * 0.958023078625, 0))
        make_face()
    fillet2_2_piece_17 = extrude(amount=24.30046157249958, mode=Mode.PRIVATE)
    fillet2_2_piece_17 = split(fillet2_2_piece_17, bisect_by=Plane(origin=(-4.55, -9.166381712824048, -58.150107189121094), z_dir=(-1, 0, 0)), keep=Keep.TOP, mode=Mode.PRIVATE)
    add(fillet2_2_piece_17, mode=Mode.SUBTRACT)
    with BuildSketch(Plane(origin=(-19.28023078624979, -9.980598640003508, -58.99999999999999), x_dir=(0, -0.042857142857142885, 0.9990812105660493), z_dir=(1, 0, 0))) as fillet2_2_piece_18_section:
        with BuildLine():
            CenterArc((FILLET2_R * 0.958023078625, -FILLET2_R), FILLET2_R, 89.99999999999999, 87.54371427641804)
            Line((-FILLET2_R * 0.0410581319411, -FILLET2_R * 0.957142857143), (0, 0))
            Line((0, 0), (FILLET2_R * 0.958023078625, 0))
        make_face()
    fillet2_2_piece_18 = extrude(amount=24.30046157249958, mode=Mode.PRIVATE)
    fillet2_2_piece_18 = split(fillet2_2_piece_18, bisect_by=Plane(origin=(2.9600000000000004, -9.16638171282405, -58.15010718912107), z_dir=(1, 0, 0)), keep=Keep.TOP, mode=Mode.PRIVATE)
    add(fillet2_2_piece_18, mode=Mode.SUBTRACT)
    with BuildSketch(Plane(origin=(-20.138161901436334, -11.825150537654586, -15.999999999999993), x_dir=(0, 1, 0), z_dir=(1, 0, 0))) as fillet2_2_piece_19_section:
        with BuildLine():
            CenterArc((FILLET2_R * 1.04381619014, -FILLET2_R), FILLET2_R, 89.99999999999999, 92.45628572358197)
            Line((FILLET2_R * 0.0447349795776, -FILLET2_R * 1.04285714286), (0, 0))
            Line((0, 0), (FILLET2_R * 1.04381619014, 0))
        make_face()
    fillet2_2_piece_19 = extrude(amount=26.01632380287267, mode=Mode.PRIVATE)
    fillet2_2_piece_19 = split(fillet2_2_piece_19, bisect_by=Plane(origin=(-2.95, -10.846311572952871, -16.93775031844161), z_dir=(-1, 0, 0)), keep=Keep.TOP, mode=Mode.PRIVATE)
    add(fillet2_2_piece_19, mode=Mode.SUBTRACT)
    with BuildSketch(Plane(origin=(-20.138161901436334, -11.825150537654586, -15.999999999999993), x_dir=(0, 1, 0), z_dir=(1, 0, 0))) as fillet2_2_piece_20_section:
        with BuildLine():
            CenterArc((FILLET2_R * 1.04381619014, -FILLET2_R), FILLET2_R, 89.99999999999999, 92.45628572358197)
            Line((FILLET2_R * 0.0447349795776, -FILLET2_R * 1.04285714286), (0, 0))
            Line((0, 0), (FILLET2_R * 1.04381619014, 0))
        make_face()
    fillet2_2_piece_20 = extrude(amount=26.01632380287267, mode=Mode.PRIVATE)
    fillet2_2_piece_20 = split(fillet2_2_piece_20, bisect_by=Plane(origin=(2.9600000000000004, -10.846311572952871, -16.937750318441594), z_dir=(1, 0, 0)), keep=Keep.TOP, mode=Mode.PRIVATE)
    add(fillet2_2_piece_20, mode=Mode.SUBTRACT)

    # Sketch7 → Boss-Extrude5 (add, two sides: drawn at the far end of the back side and taken through both)
    with BuildSketch(Plane(origin=(2.95, 0, 0), x_dir=(0, 0, -1), z_dir=(1, 0, 0)).offset(-BOSS_EXTRUDE5_DEPTH_BACK)):
        with Locations((70, 0)):
            Circle(SKETCH7_R)
    extrude(amount=BOSS_EXTRUDE5_DEPTH + BOSS_EXTRUDE5_DEPTH_BACK)


with BuildPart() as cut_extrude2_tool:
    # Sketch8 → Cut-Extrude2 (with draft: the straight prism first)
    with BuildSketch(Plane(origin=(9.899999999999999, 0, 0), x_dir=(0, 0, -1), z_dir=(1, 0, 0))):
        with Locations((19.99999999999999, 0)):
            Circle(SKETCH8_R)
    extrude(amount=-CUT_EXTRUDE2_DEPTH)
    # Cut-Extrude2: the draft: its side faces are tilted about the plane it starts from
    cut_extrude2_sides = [cut_extrude2_tool.faces().sort_by_distance(p)[0] for p in [
        (9.85, 0, -18),
    ]]
    draft(cut_extrude2_sides, Plane(origin=(9.899999999999999, 0, 0), x_dir=(0, 0, -1), z_dir=(1, 0, 0)), CUT_EXTRUDE2_DRAFT)


with BuildPart() as part_1:
    add(part.part)

    # Cut-Extrude2: cut by cut_extrude2_tool
    add(cut_extrude2_tool.part, mode=Mode.SUBTRACT)


with BuildPart() as cut_extrude2_profile_2_tool:
    # Sketch8 → Cut-Extrude2 profile 2 (with draft: the straight prism first)
    with BuildSketch(Plane(origin=(9.899999999999999, 0, 0), x_dir=(0, 0, -1), z_dir=(1, 0, 0))):
        with Locations((55.999999999999986, -4)):
            Circle(SKETCH8_R)
    extrude(amount=-CUT_EXTRUDE2_PROFILE_2_DEPTH)
    # Cut-Extrude2 profile 2: the draft: its side faces are tilted about the plane it starts from
    cut_extrude2_profile_2_sides = [cut_extrude2_profile_2_tool.faces().sort_by_distance(p)[0] for p in [
        (9.85, -4, -54),
    ]]
    draft(cut_extrude2_profile_2_sides, Plane(origin=(9.899999999999999, 0, 0), x_dir=(0, 0, -1), z_dir=(1, 0, 0)), CUT_EXTRUDE2_PROFILE_2_DRAFT)


with BuildPart() as part_2:
    add(part_1.part)

    # Cut-Extrude2 profile 2: cut by cut_extrude2_profile_2_tool
    add(cut_extrude2_profile_2_tool.part, mode=Mode.SUBTRACT)


with BuildPart() as cut_extrude3_tool:
    # Sketch9 → Cut-Extrude3 (with draft: the straight prism first)
    with BuildSketch(Plane(origin=(9.799999999999999, 0, 0), x_dir=(0, 0, -1), z_dir=(1, 0, 0))):
        Polygon((20.24999999999999, -0.2500000000000001), (21.399999999999988, -0.25000000000000006), (21.399999999999988, 0.24999999999999994), (20.24999999999999, 0.24999999999999994), (20.250000000000007, 1.399999999999995), (19.750000000000007, 1.400000000000002), (19.749999999999993, 0.25000000000000183), (18.599999999999994, 0.2500000000000099), (18.599999999999987, -0.24999999999999015), (19.74999999999999, -0.2500000000000002), (19.749999999999986, -1.3999999999999986), (20.249999999999982, -1.3999999999999986), align=None)
    extrude(amount=-CUT_EXTRUDE3_DEPTH)
    # Cut-Extrude3: the draft: its side faces are tilted about the plane it starts from
    cut_extrude3_sides = [cut_extrude3_tool.faces().sort_by_distance(p)[0] for p in [
        (9.65, -0.25, -20.825),
        (9.65, 0, -21.4),
        (9.65, 0.25, -20.825),
        (9.65, 0.825, -20.25),
        (9.65, 1.4, -20),
        (9.65, 0.825, -19.75),
        (9.65, 0.25, -19.175),
        (9.65, 0, -18.6),
        (9.65, -0.25, -19.175),
        (9.65, -0.825, -19.75),
        (9.65, -1.4, -20),
        (9.65, -0.825, -20.25),
    ]]
    draft(cut_extrude3_sides, Plane(origin=(9.799999999999999, 0, 0), x_dir=(0, 0, -1), z_dir=(1, 0, 0)), CUT_EXTRUDE3_DRAFT)


with BuildPart() as part_3:
    add(part_2.part)

    # Cut-Extrude3: cut by cut_extrude3_tool
    add(cut_extrude3_tool.part, mode=Mode.SUBTRACT)


with BuildPart() as cut_extrude3_profile_2_tool:
    # Sketch9 → Cut-Extrude3 profile 2 (with draft: the straight prism first)
    with BuildSketch(Plane(origin=(9.799999999999999, 0, 0), x_dir=(0, 0, -1), z_dir=(1, 0, 0))):
        Polygon((55.70121951219512, -4.189024390243886), (55.44878048780488, -5.310975609756081), (55.93658536585367, -5.420731707317056), (56.189024390243894, -4.298780487804862), (57.31097560975609, -4.551219512195095), (57.42073170731707, -4.063414634146313), (56.29878048780487, -3.8109756097560785), (56.551219512195104, -2.6890243902438806), (56.063414634146326, -2.5792682926829116), (55.81097560975609, -3.701219512195106), (54.6890243902439, -3.448780487804864), (54.579268292682926, -3.936585365853644), align=None)
    extrude(amount=-CUT_EXTRUDE3_PROFILE_2_DEPTH)
    # Cut-Extrude3 profile 2: the draft: its side faces are tilted about the plane it starts from
    cut_extrude3_profile_2_sides = [cut_extrude3_profile_2_tool.faces().sort_by_distance(p)[0] for p in [
        (9.65, -4.75, -55.575),
        (9.65, -5.365853659, -55.692682927),
        (9.65, -4.859756098, -56.062804878),
        (9.65, -4.425, -56.75),
        (9.65, -4.307317073, -57.365853659),
        (9.65, -3.937195122, -56.859756098),
        (9.65, -3.25, -56.425),
        (9.65, -2.634146341, -56.307317073),
        (9.65, -3.140243902, -55.937195122),
        (9.65, -3.575, -55.25),
        (9.65, -3.692682927, -54.634146341),
        (9.65, -4.062804878, -55.140243902),
    ]]
    draft(cut_extrude3_profile_2_sides, Plane(origin=(9.799999999999999, 0, 0), x_dir=(0, 0, -1), z_dir=(1, 0, 0)), CUT_EXTRUDE3_PROFILE_2_DRAFT)


with BuildPart() as part_4:
    add(part_3.part)

    # Cut-Extrude3 profile 2: cut by cut_extrude3_profile_2_tool
    add(cut_extrude3_profile_2_tool.part, mode=Mode.SUBTRACT)


solid = part_4.part
